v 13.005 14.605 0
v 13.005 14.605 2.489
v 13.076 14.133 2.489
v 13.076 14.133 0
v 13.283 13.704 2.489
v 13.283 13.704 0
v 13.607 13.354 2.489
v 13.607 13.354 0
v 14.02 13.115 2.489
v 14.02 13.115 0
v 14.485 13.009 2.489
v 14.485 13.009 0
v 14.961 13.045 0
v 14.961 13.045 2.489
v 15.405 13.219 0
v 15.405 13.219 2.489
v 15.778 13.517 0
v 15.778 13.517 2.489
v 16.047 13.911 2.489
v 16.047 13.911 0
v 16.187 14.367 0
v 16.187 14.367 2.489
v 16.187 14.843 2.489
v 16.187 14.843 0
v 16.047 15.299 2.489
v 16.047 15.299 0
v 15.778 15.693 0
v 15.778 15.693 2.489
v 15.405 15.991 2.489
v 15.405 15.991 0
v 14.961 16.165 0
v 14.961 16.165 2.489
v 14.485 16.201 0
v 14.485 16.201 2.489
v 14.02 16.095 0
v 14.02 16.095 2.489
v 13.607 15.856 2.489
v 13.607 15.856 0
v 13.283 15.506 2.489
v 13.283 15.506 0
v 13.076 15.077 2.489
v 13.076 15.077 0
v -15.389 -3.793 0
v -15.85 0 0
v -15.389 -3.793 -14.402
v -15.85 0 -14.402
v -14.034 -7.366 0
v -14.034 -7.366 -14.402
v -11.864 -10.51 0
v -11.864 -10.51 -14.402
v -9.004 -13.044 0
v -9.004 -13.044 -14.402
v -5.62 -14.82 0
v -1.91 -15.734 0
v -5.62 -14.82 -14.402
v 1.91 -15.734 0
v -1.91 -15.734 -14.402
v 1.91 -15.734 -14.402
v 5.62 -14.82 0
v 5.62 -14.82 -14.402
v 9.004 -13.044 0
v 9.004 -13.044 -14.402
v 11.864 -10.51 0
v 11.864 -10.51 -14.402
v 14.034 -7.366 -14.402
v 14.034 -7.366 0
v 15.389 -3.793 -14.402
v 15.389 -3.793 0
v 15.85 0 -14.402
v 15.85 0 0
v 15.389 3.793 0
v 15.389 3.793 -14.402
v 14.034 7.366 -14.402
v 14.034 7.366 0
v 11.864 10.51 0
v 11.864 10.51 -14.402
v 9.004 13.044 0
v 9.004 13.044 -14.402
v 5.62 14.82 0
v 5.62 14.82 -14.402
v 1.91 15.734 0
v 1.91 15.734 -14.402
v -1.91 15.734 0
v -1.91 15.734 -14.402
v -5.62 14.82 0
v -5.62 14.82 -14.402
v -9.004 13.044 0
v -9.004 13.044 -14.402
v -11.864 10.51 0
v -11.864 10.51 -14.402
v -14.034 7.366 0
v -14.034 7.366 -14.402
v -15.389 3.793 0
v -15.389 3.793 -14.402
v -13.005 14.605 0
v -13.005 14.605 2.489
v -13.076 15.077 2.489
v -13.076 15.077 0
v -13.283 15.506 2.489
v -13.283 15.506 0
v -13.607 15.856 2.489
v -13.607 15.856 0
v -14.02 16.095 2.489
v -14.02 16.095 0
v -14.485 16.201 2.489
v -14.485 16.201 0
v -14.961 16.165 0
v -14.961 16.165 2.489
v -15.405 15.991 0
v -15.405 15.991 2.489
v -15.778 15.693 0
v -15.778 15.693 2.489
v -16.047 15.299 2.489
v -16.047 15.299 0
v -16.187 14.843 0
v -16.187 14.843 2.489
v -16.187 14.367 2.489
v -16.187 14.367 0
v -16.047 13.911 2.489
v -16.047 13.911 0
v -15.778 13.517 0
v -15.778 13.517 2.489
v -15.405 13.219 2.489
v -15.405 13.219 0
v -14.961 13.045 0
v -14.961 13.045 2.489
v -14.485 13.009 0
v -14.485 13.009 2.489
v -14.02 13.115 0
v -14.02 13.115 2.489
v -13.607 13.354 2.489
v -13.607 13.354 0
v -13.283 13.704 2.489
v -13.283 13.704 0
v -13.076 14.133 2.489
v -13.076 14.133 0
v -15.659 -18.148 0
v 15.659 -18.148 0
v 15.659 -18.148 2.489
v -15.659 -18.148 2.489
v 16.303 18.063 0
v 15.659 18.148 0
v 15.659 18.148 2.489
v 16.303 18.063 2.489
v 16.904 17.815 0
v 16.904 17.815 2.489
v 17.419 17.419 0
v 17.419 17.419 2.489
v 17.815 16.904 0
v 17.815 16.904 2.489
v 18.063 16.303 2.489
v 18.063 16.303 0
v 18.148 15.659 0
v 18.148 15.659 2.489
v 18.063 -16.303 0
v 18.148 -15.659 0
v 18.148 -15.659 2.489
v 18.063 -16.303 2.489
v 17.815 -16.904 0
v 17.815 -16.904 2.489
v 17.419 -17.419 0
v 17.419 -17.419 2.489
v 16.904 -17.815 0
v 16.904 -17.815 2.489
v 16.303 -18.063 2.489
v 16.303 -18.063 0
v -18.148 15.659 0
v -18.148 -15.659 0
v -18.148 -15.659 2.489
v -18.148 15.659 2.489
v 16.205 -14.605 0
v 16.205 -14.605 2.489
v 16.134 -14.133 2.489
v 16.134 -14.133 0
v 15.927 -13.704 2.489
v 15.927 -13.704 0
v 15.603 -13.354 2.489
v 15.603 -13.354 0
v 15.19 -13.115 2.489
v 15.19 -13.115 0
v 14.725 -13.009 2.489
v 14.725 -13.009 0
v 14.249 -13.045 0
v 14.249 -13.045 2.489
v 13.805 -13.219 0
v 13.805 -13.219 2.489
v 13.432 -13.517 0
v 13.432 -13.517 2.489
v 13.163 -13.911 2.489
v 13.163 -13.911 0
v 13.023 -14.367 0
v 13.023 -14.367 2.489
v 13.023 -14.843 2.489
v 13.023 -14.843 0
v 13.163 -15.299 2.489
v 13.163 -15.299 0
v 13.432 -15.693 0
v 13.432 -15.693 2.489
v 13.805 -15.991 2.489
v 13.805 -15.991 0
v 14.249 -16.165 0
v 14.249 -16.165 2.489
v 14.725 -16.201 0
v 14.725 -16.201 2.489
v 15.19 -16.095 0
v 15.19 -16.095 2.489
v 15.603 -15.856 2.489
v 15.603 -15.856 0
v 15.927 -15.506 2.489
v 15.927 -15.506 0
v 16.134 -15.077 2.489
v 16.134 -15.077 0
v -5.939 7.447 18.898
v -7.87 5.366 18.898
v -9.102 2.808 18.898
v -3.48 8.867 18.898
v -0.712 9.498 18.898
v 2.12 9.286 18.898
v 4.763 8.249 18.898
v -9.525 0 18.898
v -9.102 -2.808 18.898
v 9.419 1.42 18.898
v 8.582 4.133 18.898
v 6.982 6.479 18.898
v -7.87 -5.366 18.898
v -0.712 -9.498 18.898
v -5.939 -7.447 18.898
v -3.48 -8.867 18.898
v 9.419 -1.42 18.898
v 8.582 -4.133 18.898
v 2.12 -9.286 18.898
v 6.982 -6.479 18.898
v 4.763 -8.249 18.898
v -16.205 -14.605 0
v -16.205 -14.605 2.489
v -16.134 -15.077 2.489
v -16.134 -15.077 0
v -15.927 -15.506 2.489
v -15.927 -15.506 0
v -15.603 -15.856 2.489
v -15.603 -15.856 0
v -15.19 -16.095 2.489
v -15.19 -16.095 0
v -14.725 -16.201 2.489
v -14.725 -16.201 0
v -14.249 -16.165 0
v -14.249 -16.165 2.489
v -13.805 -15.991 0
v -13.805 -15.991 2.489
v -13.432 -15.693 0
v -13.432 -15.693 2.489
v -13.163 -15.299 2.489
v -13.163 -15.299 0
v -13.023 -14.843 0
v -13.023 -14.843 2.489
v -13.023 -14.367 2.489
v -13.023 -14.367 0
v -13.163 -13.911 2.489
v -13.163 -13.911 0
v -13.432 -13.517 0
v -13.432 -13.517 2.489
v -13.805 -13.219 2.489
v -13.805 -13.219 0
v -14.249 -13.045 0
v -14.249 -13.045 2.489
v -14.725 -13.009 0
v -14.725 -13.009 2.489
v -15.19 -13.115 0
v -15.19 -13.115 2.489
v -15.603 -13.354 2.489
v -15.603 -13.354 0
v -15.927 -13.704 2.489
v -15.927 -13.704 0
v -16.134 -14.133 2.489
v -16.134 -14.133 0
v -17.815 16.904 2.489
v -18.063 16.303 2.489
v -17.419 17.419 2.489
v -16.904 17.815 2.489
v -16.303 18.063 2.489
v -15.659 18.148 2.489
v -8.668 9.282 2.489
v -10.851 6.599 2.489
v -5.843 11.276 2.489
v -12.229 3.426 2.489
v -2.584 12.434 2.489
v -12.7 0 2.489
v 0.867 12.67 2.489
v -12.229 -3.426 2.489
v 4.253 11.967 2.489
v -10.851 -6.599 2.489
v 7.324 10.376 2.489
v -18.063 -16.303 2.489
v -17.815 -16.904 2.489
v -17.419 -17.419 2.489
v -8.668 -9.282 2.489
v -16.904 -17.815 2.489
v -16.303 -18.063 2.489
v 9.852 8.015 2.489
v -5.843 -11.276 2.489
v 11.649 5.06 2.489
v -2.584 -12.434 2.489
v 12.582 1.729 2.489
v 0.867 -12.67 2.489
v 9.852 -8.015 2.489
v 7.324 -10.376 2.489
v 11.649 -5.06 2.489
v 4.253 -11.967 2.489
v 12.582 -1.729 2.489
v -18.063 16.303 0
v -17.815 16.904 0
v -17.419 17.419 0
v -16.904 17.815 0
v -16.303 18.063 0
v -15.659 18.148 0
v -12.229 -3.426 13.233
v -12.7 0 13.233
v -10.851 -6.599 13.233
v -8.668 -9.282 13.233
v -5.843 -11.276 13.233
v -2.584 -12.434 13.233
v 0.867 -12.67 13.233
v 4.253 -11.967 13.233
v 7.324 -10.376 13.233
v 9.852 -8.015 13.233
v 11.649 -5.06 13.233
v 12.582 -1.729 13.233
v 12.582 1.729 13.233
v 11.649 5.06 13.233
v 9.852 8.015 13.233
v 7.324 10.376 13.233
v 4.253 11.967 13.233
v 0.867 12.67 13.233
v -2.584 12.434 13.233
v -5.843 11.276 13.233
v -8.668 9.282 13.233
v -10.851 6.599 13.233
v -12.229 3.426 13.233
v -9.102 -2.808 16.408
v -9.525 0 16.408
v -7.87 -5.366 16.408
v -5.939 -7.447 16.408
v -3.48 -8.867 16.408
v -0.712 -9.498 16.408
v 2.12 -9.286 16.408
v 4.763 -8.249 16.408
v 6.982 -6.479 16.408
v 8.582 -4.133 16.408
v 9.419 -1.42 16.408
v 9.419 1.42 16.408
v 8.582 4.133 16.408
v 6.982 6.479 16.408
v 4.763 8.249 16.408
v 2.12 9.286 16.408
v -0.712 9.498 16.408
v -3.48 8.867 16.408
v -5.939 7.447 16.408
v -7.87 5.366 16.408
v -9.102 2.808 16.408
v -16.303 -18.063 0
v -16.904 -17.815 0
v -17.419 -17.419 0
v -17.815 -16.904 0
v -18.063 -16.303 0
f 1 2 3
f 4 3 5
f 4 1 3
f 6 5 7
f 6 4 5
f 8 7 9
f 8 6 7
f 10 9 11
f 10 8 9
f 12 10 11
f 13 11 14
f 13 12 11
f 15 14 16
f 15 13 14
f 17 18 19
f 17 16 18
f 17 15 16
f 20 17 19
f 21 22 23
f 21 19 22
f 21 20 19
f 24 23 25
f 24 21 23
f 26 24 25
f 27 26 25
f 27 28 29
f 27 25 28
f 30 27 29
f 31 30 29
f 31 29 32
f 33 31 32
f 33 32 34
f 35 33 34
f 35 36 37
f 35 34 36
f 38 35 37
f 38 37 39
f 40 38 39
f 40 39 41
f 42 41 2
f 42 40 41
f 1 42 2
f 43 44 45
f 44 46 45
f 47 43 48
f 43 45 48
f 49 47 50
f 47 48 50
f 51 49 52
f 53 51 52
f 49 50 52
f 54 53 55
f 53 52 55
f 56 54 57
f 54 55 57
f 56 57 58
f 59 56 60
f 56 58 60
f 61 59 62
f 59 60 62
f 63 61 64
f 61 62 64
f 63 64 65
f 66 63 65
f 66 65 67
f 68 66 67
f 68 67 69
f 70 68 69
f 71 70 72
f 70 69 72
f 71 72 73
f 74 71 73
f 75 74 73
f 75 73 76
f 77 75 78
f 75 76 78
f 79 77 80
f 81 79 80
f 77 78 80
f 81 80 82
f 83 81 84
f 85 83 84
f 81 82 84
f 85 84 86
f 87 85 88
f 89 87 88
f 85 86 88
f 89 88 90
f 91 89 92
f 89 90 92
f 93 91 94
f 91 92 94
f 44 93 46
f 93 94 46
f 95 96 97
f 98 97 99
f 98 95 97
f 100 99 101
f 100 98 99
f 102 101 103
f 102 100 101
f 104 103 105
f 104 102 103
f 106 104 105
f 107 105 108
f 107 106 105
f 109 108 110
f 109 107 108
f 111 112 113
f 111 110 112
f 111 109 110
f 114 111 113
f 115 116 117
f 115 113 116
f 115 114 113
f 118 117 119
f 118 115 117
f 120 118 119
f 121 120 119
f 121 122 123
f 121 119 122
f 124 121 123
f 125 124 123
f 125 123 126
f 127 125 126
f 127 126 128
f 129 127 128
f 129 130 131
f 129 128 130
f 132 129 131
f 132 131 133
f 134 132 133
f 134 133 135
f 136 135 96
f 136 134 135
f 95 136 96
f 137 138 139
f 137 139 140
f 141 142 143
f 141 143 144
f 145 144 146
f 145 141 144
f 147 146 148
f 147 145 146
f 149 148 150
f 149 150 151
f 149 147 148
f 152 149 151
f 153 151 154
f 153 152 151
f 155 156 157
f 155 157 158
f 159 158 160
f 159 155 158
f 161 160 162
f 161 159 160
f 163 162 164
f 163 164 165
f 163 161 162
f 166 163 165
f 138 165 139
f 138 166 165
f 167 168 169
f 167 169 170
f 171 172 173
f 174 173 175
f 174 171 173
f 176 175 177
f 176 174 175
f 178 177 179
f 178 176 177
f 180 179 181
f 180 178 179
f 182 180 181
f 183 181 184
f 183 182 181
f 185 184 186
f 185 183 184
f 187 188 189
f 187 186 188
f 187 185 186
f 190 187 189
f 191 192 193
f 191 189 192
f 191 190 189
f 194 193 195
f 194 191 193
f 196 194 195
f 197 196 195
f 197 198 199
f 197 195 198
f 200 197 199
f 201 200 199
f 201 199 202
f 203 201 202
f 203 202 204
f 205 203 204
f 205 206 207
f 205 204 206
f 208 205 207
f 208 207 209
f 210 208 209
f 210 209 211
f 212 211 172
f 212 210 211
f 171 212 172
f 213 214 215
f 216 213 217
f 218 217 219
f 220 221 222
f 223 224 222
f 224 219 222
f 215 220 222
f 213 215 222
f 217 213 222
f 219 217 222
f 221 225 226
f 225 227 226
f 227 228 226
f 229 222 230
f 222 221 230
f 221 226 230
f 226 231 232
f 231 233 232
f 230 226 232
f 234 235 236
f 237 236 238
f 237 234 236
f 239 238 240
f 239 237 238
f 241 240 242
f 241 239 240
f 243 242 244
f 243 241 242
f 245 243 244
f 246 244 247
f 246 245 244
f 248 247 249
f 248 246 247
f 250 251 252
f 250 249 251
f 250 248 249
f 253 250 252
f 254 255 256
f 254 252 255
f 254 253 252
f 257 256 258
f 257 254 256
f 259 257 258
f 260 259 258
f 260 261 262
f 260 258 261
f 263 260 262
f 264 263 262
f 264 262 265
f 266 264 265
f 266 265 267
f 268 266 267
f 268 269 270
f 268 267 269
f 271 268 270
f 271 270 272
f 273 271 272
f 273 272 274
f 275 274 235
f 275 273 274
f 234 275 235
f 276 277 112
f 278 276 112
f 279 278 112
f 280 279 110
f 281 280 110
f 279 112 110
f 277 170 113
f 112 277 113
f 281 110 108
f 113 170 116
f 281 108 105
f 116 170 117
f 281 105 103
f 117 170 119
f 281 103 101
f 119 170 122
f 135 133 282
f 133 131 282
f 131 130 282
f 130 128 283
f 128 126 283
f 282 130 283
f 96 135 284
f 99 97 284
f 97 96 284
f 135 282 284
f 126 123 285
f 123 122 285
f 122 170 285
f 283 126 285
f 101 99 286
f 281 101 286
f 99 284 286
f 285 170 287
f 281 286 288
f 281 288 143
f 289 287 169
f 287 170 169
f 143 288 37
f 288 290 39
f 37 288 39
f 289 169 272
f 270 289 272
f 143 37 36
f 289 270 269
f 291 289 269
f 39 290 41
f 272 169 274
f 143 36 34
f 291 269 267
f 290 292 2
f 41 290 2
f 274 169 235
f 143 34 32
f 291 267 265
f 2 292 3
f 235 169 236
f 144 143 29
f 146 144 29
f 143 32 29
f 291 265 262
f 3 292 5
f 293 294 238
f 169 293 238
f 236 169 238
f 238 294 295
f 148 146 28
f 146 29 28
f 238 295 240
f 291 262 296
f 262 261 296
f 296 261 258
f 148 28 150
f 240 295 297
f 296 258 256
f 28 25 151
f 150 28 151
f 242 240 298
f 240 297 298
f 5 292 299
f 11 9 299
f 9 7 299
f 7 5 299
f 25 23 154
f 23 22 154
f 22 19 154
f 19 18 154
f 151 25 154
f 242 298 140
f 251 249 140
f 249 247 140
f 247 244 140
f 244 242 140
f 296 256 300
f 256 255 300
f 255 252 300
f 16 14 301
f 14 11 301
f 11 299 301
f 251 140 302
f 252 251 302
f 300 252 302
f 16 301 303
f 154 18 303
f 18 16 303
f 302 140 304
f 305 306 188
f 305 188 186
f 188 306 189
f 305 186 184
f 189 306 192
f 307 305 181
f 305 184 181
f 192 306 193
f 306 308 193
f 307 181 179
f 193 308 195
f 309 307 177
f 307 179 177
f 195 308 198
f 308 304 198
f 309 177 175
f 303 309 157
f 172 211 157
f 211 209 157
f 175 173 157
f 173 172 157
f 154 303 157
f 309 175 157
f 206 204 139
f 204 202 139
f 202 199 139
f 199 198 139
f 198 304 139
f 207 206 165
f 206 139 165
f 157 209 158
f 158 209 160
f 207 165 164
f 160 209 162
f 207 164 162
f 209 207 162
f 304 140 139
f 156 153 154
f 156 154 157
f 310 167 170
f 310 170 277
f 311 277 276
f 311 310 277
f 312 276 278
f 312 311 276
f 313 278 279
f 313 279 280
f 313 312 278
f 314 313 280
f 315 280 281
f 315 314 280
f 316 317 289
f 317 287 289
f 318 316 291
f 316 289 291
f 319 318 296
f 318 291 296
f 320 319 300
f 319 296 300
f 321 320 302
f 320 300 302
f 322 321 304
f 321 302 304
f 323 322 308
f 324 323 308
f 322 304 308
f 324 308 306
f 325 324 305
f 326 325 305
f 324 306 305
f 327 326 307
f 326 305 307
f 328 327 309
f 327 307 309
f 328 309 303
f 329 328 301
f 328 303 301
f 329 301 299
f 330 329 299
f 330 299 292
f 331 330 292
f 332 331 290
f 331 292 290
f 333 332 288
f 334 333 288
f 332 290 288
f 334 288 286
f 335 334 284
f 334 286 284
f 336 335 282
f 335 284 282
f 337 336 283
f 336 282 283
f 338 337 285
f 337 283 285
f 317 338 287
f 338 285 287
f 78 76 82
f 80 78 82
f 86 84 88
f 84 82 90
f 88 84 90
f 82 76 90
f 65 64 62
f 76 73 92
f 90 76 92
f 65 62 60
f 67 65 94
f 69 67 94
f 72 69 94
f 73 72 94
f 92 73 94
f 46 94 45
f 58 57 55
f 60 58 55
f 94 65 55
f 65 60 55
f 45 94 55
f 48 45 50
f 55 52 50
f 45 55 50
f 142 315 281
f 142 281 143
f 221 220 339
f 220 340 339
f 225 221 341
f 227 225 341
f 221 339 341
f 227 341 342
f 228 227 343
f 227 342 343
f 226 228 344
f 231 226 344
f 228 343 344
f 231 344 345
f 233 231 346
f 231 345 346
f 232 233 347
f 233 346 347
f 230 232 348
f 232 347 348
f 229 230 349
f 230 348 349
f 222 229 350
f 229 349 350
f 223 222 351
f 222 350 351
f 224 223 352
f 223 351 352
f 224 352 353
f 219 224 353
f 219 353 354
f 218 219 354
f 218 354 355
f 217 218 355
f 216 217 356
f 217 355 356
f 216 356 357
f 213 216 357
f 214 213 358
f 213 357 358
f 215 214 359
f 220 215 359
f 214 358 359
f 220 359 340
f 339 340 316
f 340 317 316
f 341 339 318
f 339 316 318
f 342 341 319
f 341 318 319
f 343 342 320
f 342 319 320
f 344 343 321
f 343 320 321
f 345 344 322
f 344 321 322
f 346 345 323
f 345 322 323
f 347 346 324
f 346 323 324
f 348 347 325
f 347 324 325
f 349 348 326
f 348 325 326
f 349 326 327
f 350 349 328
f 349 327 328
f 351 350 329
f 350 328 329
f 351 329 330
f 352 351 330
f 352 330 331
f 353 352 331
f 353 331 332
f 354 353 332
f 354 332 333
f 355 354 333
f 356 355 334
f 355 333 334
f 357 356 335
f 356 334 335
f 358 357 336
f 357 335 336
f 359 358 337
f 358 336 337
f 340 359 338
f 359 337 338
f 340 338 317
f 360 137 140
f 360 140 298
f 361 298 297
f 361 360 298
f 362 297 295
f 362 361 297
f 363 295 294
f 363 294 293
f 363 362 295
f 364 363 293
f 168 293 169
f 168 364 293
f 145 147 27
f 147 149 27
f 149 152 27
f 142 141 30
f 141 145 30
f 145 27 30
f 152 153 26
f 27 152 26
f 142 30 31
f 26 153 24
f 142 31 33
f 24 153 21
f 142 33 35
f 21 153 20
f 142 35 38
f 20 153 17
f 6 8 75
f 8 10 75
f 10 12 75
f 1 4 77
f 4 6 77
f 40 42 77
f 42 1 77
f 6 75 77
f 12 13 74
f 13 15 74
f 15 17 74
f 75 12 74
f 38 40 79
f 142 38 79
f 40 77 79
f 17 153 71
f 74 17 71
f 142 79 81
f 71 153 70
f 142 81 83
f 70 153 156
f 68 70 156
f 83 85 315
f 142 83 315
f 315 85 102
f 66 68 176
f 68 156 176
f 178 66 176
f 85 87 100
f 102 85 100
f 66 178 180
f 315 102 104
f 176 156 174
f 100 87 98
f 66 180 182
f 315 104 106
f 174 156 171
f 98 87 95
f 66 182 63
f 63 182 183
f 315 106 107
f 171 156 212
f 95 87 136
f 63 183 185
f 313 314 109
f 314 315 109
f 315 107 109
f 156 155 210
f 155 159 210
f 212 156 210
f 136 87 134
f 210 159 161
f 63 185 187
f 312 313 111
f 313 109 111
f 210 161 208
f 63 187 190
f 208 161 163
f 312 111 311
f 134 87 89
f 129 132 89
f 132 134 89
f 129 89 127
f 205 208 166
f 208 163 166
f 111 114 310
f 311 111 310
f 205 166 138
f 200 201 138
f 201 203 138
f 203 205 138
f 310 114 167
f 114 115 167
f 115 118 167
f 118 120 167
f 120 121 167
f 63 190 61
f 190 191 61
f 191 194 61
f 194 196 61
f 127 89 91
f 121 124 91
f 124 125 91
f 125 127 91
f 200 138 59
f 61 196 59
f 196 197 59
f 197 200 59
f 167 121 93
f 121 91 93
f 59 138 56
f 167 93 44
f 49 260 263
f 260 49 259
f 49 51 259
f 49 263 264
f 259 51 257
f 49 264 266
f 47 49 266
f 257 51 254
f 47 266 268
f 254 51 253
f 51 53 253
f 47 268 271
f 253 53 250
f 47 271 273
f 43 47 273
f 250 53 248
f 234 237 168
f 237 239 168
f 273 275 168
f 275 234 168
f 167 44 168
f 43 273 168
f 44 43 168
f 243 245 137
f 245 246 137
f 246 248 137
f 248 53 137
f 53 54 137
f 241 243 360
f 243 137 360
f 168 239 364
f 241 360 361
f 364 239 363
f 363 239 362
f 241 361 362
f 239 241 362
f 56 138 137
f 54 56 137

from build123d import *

# Parameters (mm, degrees)
SKETCH2_OUTSIDE_W  = 68.636
SKETCH2_OUTSIDE_H  = 68.636
CUT_EXTRUDE2_DEPTH = 41.588659571
SKETCH4_R          = 1.6002
CUT_EXTRUDE4_DEPTH = 32.872258651


with BuildPart() as part:
    # Sketch1 → Revolve1 (revolve)
    with BuildSketch(Plane(origin=(0, 0, 0), x_dir=(0, 0, -1), z_dir=(1, 0, 0)), mode=Mode.PRIVATE) as revolve1_sk:
        Polygon((-2.4892, 25.4), (0, 25.4), (0, 15.8496), (14.4018, 15.8496), (14.4018, 0), (-18.8976, 0), (-18.8976, 9.525), (-16.4084, 9.525), (-13.2334, 12.7), (-2.4892, 12.7), align=None)
    revolve(revolve1_sk.sketch.rotate(Axis((0, 0, 0), (0, 0, 1)), 90), axis=Axis((0, 0, 0), (0, 0, 1)))

    # Sketch2 outside → Cut-Extrude2 (cut, through all)
    with BuildSketch(Plane.XY):
        Rectangle(SKETCH2_OUTSIDE_W, SKETCH2_OUTSIDE_H)
        with BuildLine():
            Line((-15.6591, 18.1483), (15.6591, 18.1483))
            ThreePointArc((15.6591, 18.1483), (17.4192302, 17.4192302), (18.1483, 15.6591))
            Line((18.1483, 15.6591), (18.1483, -15.6591))
            ThreePointArc((18.1483, -15.6591), (17.4192302, -17.4192302), (15.6591, -18.1483))
            Line((15.6591, -18.1483), (-15.6591, -18.1483))
            ThreePointArc((-15.6591, -18.1483), (-17.4192302, -17.4192302), (-18.1483, -15.6591))
            Line((-18.1483, -15.6591), (-18.1483, 15.6591))
            ThreePointArc((-18.1483, 15.6591), (-17.4192302, 17.4192302), (-15.6591, 18.1483))
        make_face(mode=Mode.SUBTRACT)
    extrude(amount=CUT_EXTRUDE2_DEPTH, mode=Mode.SUBTRACT)

    # Sketch4 → Cut-Extrude4 (cut, through all)
    with BuildSketch(Plane.XY):
        with Locations((-14.605, 14.605)):
            Circle(SKETCH4_R)
        with Locations(Location((14.605, 14.605, 0), (0, 0, 180))):
            Circle(SKETCH4_R)
        with Locations(Location((-14.605, -14.605, 0), (0, 0, 180))):
            Circle(SKETCH4_R)
        with Locations((14.605, -14.605)):
            Circle(SKETCH4_R)
    extrude(amount=CUT_EXTRUDE4_DEPTH, mode=Mode.SUBTRACT)


solid = part.part
